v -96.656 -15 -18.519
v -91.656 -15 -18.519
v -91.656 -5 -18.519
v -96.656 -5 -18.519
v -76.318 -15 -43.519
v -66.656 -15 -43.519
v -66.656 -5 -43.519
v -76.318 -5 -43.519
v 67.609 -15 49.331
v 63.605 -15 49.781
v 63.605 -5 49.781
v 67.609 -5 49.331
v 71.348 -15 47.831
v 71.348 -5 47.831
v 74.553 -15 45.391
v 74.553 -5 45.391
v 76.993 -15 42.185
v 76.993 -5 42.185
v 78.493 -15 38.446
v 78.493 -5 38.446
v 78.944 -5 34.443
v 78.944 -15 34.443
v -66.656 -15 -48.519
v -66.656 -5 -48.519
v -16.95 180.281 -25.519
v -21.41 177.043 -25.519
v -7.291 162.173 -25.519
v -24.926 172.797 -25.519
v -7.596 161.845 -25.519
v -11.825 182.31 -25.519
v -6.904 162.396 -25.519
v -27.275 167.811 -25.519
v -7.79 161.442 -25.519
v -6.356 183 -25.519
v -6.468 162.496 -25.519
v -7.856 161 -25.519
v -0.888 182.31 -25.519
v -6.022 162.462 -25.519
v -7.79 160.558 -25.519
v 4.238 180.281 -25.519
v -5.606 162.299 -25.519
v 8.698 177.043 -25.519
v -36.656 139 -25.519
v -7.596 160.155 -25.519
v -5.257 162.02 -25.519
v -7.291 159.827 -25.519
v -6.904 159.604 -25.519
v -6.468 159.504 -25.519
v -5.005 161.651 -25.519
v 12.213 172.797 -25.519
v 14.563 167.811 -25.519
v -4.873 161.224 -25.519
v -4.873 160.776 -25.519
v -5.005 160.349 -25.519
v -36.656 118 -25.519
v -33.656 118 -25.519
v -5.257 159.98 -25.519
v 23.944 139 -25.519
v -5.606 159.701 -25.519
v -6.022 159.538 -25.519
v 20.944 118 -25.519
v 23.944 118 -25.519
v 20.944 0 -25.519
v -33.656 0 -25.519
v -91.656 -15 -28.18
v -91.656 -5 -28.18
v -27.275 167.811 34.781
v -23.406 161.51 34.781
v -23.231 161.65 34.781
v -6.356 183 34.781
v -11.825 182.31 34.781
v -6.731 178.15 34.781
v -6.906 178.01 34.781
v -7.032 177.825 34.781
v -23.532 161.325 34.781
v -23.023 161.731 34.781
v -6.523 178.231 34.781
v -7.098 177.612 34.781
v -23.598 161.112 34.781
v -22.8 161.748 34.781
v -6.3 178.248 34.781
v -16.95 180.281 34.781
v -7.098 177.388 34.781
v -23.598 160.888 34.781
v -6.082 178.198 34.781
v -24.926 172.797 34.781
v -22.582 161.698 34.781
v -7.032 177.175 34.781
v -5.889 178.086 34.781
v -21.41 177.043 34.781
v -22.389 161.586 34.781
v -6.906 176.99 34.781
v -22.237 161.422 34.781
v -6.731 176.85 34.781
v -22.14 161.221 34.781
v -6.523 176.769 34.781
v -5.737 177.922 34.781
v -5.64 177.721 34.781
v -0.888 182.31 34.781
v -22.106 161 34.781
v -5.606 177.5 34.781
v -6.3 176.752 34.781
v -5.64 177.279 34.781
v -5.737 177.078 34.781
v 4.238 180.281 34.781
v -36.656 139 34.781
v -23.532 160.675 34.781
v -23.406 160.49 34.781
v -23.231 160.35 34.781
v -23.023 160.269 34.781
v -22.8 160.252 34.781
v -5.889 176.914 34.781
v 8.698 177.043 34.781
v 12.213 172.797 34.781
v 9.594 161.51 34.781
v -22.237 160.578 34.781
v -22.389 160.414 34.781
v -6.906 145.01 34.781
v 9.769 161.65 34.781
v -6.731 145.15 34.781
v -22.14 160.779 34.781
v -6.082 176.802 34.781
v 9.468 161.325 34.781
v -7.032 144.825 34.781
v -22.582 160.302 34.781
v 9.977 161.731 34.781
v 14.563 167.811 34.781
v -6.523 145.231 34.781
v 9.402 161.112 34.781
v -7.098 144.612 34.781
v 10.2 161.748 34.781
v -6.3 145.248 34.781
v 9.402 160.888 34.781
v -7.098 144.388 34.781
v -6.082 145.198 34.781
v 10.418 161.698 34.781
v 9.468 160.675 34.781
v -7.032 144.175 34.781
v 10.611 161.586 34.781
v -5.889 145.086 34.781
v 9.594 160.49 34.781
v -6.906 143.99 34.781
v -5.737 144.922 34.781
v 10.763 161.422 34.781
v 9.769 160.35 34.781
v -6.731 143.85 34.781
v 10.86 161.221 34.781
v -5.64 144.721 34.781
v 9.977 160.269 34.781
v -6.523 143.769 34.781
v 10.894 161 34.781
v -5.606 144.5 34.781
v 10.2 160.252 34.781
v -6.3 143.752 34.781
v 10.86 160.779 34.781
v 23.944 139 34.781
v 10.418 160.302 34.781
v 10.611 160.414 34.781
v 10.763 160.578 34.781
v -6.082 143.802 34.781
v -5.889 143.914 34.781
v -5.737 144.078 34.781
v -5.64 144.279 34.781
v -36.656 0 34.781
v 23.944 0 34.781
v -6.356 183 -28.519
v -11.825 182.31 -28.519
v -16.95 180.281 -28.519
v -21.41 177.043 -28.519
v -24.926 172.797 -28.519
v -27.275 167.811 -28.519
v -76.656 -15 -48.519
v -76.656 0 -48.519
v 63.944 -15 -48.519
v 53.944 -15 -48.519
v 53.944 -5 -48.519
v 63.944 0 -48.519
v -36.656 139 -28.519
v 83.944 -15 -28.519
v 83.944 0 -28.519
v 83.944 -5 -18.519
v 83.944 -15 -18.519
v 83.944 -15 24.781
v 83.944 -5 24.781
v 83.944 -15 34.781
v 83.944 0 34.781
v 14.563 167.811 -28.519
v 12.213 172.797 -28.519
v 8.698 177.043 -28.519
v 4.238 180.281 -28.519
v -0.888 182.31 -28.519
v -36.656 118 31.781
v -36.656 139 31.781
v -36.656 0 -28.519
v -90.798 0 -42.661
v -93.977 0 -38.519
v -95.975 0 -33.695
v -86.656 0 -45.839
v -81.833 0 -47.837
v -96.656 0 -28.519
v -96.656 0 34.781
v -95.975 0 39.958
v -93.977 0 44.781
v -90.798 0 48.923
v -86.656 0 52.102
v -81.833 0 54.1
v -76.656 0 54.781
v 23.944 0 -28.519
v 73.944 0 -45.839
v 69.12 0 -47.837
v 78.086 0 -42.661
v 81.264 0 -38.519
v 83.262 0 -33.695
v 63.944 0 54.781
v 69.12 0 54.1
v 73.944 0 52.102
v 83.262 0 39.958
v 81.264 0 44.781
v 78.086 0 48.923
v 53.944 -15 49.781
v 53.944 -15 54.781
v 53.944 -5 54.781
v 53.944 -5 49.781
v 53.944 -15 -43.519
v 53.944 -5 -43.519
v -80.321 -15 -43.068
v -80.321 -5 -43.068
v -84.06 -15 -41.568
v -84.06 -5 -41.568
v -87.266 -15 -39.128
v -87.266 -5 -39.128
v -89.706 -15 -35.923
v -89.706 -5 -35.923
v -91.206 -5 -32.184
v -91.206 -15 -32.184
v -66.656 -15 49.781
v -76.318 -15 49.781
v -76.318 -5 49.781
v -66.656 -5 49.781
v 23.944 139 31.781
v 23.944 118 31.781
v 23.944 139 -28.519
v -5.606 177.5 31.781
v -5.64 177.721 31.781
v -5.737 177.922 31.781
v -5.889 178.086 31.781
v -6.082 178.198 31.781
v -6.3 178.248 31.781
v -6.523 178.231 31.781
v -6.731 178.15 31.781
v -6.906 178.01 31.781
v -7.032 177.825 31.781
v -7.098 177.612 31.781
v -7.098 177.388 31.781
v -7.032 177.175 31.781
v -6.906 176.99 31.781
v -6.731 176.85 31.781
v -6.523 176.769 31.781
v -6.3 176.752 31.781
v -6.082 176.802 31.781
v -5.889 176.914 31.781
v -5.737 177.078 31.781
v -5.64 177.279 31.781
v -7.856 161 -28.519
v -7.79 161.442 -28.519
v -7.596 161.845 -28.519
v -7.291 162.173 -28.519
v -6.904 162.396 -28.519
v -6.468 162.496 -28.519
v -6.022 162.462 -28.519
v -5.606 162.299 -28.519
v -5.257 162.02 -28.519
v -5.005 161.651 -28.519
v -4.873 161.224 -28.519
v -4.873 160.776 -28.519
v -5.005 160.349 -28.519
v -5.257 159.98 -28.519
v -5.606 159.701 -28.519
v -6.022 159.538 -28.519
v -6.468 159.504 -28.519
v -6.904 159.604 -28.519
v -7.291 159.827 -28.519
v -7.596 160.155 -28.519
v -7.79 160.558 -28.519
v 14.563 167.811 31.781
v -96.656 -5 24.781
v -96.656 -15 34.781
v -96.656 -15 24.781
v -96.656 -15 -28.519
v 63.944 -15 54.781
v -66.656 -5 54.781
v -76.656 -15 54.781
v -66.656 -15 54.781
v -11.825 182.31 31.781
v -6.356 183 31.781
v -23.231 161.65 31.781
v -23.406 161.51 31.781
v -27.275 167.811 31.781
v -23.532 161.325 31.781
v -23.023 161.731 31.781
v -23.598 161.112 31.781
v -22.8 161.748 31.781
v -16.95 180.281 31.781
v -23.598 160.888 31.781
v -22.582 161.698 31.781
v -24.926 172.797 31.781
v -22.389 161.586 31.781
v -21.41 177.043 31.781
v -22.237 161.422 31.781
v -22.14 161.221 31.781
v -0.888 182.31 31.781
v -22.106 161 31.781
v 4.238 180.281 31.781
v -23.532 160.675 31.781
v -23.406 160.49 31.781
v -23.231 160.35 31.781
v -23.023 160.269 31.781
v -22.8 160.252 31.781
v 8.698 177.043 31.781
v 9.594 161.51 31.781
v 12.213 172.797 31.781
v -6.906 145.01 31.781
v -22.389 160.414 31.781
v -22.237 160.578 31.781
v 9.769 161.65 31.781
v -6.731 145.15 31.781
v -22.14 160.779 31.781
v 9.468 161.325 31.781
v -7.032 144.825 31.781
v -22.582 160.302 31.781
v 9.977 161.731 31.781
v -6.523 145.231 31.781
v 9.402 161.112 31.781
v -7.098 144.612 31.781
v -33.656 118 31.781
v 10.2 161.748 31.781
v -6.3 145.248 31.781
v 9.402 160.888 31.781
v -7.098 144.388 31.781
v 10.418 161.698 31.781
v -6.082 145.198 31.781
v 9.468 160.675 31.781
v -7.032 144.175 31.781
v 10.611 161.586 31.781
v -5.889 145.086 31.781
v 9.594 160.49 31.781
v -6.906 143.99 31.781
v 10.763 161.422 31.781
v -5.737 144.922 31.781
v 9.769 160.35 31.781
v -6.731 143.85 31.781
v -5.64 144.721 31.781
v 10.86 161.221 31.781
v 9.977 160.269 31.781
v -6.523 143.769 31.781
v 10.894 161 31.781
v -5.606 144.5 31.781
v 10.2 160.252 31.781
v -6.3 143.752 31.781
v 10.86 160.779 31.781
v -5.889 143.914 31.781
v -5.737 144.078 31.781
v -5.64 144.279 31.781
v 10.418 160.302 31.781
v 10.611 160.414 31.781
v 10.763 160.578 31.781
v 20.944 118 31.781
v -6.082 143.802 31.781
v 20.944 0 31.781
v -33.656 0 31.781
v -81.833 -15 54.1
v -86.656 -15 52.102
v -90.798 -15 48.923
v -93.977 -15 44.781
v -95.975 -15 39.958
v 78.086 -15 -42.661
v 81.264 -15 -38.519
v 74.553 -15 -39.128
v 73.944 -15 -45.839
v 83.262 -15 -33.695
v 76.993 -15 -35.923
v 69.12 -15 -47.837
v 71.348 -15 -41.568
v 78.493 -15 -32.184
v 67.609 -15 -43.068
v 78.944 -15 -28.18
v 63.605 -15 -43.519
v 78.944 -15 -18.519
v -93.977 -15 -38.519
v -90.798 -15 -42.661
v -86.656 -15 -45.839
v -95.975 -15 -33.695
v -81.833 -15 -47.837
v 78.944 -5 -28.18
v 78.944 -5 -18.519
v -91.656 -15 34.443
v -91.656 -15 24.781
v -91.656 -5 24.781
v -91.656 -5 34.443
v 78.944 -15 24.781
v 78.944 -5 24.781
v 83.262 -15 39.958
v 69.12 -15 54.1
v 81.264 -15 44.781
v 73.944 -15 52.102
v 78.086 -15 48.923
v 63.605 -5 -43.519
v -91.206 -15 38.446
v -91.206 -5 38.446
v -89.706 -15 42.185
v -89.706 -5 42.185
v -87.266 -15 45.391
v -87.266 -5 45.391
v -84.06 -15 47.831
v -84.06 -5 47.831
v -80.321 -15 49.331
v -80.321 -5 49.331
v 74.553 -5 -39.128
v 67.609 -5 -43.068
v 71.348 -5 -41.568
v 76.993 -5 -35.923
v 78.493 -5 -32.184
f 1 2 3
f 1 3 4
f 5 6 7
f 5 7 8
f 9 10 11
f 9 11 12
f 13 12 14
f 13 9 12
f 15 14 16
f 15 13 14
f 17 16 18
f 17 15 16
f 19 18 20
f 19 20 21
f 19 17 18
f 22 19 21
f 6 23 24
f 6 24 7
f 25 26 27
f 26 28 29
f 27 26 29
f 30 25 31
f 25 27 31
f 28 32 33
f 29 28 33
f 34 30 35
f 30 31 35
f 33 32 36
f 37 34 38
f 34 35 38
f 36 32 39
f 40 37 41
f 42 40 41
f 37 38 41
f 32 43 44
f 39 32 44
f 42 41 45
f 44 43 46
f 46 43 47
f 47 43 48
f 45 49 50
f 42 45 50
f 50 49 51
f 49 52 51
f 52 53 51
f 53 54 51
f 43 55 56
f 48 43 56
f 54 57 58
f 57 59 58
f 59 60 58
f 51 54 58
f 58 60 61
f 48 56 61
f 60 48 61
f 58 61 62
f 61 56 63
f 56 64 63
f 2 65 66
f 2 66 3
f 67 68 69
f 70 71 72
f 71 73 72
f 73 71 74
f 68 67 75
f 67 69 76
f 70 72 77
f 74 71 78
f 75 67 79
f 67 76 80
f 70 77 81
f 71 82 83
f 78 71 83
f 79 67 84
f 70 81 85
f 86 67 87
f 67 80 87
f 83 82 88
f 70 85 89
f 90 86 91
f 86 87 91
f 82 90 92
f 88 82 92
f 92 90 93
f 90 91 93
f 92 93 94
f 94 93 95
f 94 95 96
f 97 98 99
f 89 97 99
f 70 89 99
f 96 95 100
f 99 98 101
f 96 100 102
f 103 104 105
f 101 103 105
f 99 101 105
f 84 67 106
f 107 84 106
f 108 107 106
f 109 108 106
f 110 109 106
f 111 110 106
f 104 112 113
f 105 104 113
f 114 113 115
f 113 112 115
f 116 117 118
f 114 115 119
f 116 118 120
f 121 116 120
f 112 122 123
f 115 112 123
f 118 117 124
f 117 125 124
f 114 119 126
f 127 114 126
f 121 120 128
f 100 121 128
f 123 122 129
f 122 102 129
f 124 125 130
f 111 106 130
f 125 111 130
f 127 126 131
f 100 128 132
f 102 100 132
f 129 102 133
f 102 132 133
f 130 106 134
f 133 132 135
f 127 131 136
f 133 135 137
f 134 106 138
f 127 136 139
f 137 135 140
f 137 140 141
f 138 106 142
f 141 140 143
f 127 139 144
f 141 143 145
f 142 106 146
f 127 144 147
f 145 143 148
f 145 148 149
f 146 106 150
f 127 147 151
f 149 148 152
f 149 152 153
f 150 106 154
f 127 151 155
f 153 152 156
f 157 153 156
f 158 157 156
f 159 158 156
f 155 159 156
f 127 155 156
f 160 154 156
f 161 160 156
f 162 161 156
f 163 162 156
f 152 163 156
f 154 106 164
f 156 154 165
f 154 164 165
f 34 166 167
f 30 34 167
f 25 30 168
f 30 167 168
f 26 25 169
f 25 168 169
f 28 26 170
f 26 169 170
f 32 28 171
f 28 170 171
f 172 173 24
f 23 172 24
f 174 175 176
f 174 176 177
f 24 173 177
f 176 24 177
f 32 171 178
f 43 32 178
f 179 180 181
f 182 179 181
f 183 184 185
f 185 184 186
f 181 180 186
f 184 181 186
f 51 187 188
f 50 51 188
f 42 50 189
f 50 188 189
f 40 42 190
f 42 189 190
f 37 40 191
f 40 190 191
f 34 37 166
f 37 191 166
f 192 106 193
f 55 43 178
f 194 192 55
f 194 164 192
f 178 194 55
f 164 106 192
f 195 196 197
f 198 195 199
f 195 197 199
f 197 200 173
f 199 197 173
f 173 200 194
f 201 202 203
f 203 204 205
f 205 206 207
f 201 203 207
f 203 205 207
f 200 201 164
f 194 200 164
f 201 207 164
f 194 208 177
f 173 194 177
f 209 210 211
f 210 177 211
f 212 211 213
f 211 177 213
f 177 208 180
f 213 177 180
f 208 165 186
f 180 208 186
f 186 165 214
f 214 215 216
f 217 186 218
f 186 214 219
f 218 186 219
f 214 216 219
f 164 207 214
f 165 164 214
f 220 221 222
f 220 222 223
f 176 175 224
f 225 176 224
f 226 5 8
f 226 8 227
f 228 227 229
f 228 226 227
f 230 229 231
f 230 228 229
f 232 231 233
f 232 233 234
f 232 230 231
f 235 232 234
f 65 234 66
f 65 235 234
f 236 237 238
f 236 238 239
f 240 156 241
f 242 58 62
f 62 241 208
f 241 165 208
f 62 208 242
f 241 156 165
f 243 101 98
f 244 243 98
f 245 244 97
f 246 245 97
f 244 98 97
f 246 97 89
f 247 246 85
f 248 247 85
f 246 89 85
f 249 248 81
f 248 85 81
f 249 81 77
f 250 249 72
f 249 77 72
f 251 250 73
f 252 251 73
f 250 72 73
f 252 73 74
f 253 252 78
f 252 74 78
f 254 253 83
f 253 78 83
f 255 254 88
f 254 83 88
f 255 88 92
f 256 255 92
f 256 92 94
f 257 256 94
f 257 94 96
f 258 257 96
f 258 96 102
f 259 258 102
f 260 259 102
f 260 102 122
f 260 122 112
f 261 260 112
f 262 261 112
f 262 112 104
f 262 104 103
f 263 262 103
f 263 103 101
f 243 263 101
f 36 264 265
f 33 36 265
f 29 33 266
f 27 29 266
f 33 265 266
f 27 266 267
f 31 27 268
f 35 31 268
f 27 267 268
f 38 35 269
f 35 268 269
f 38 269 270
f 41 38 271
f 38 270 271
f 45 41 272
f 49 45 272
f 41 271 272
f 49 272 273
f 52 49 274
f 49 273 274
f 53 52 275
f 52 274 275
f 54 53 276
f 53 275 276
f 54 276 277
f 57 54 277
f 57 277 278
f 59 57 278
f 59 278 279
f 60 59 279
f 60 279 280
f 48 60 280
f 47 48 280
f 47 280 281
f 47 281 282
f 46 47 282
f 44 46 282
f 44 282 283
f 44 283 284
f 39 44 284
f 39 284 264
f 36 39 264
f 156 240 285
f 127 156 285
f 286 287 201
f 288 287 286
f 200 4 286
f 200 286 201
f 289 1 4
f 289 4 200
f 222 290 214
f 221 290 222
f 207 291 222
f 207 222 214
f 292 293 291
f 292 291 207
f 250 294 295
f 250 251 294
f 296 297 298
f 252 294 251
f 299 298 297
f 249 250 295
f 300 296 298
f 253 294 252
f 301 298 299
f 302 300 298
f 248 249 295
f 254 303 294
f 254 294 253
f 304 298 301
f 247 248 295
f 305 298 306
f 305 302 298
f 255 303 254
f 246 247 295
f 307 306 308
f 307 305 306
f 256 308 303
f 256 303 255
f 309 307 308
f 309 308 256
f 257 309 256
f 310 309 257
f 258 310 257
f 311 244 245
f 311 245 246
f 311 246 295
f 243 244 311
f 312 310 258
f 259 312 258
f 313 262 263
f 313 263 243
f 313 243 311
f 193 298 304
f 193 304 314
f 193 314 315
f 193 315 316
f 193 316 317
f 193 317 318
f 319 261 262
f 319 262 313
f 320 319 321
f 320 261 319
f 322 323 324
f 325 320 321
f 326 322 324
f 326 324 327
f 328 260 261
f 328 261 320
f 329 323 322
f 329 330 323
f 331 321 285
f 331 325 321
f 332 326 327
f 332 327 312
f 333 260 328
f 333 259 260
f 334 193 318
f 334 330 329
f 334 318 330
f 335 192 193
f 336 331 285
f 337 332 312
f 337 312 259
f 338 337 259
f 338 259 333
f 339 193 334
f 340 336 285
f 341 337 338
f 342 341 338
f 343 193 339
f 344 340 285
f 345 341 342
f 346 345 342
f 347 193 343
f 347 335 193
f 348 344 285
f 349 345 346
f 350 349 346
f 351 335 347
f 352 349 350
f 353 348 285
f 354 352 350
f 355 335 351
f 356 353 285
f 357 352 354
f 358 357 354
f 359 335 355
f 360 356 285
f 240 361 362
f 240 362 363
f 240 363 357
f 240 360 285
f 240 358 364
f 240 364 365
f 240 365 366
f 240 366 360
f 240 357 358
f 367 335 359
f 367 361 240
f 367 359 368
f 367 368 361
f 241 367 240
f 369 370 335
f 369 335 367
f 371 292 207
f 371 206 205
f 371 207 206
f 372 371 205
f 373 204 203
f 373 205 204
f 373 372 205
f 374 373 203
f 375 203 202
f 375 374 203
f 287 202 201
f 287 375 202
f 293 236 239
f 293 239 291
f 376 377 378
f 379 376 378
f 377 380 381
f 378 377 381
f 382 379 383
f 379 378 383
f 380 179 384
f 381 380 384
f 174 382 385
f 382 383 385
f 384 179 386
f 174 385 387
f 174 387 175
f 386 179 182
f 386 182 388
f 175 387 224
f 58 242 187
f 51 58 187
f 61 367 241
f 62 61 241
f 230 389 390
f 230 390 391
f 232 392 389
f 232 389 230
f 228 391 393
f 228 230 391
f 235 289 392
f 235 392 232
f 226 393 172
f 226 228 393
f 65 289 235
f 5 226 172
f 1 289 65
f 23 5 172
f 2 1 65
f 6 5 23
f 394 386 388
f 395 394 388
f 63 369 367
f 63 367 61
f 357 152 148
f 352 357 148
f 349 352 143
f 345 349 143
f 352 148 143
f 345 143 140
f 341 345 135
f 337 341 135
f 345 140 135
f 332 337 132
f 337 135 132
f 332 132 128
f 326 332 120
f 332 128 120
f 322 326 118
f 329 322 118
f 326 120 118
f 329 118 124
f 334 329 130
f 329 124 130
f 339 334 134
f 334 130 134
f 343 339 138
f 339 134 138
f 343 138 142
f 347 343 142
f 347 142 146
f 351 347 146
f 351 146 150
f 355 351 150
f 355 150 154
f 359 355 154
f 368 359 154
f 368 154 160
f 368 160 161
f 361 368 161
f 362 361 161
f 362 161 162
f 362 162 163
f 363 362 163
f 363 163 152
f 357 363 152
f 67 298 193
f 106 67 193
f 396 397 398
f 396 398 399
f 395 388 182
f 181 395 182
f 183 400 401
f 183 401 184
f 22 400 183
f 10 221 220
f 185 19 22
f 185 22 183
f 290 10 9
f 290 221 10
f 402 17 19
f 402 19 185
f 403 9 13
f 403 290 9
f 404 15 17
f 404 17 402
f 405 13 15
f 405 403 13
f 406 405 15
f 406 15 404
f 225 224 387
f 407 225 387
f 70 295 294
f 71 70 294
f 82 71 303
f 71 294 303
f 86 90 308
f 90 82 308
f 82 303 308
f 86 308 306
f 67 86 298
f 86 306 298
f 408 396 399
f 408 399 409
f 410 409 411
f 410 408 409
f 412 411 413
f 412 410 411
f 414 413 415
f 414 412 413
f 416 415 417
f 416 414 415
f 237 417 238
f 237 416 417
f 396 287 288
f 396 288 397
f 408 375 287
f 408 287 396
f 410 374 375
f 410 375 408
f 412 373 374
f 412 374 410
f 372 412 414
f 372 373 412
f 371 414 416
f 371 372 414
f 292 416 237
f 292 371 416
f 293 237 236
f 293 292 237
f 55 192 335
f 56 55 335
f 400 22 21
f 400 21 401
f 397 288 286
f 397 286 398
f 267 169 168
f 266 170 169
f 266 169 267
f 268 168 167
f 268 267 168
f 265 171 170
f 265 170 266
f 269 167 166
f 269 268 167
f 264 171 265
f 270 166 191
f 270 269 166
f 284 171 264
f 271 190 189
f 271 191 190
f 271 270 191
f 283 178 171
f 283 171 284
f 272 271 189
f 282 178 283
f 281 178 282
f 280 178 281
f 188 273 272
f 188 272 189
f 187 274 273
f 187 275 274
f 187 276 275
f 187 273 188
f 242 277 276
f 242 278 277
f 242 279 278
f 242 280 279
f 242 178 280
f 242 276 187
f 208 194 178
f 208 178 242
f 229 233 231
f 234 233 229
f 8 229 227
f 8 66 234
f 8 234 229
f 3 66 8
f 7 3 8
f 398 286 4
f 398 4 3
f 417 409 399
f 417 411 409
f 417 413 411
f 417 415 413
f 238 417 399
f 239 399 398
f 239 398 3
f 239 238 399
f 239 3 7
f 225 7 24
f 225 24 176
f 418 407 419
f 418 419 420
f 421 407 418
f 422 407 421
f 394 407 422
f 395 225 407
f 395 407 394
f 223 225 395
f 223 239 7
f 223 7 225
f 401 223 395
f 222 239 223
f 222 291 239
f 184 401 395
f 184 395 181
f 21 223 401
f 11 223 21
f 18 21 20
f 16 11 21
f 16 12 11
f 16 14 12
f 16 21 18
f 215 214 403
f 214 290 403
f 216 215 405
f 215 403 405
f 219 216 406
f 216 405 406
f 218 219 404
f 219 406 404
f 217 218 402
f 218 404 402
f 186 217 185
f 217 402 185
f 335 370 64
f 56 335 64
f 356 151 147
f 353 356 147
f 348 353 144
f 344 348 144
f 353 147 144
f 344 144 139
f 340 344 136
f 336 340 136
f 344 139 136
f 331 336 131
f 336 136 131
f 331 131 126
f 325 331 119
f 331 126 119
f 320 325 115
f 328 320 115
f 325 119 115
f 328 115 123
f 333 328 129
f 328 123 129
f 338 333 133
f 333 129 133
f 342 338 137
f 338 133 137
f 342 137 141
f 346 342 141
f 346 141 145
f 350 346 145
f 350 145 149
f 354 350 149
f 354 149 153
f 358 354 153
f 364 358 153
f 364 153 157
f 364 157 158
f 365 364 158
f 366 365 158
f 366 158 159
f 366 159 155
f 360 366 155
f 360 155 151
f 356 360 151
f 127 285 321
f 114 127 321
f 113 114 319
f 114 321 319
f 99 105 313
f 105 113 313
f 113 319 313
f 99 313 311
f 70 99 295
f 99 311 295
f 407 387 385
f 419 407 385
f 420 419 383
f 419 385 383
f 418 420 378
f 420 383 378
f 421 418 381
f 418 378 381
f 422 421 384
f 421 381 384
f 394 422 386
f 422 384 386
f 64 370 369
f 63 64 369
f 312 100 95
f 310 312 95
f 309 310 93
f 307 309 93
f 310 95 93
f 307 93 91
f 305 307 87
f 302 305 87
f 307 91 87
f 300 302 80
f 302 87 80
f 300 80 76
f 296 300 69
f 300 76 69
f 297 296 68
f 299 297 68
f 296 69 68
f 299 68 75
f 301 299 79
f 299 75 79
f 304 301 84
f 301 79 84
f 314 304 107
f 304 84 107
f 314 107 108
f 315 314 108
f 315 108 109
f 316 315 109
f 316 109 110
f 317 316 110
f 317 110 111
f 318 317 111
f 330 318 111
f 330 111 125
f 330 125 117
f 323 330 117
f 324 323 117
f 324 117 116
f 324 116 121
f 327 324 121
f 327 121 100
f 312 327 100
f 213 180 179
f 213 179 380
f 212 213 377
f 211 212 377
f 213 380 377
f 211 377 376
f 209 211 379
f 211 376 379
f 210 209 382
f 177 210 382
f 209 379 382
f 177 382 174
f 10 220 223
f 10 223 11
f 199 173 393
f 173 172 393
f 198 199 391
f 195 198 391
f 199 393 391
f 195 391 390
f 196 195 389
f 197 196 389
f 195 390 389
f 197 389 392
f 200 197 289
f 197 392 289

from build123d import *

# Parameters (mm, degrees)
SKETCH_1_W          = 60.6
SKETCH_1_H          = 63.3
SKETCH_1_W_2        = 54.6
SKETCH_1_H_2        = 57.3
EXTRUDE_1_DEPTH     = 118
SKETCH_2_W          = 60.6
SKETCH_2_H          = 3
EXTRUDE_2_DEPTH     = 65
CUT_EXTRUDE_1_DEPTH = 65
SKETCH_4_W          = 180.6
SKETCH_4_H          = 103.3
EXTRUDE_3_DEPTH     = 5
CUT_EXTRUDE_2_DEPTH = 5
EXTRUDE_START       = 10
EXTRUDE_4_DEPTH     = 10
SKETCH_8_R          = 0.75
CUT_EXTRUDE_3_DEPTH = 10
SKETCH_9_R          = 1.5
CUT_EXTRUDE_4_DEPTH = 10


with BuildPart() as part:
    # 草图1 → 凸台-拉伸1 (new body)
    with BuildSketch(Plane(origin=(0, 0, 0), x_dir=(1, 0, 0), z_dir=(0, 1, 0))):
        with Locations((-6.35625, -3.13125)):
            Rectangle(SKETCH_1_W, SKETCH_1_H)
        with Locations((-6.35625, -3.13125)):
            Rectangle(SKETCH_1_W_2, SKETCH_1_H_2, mode=Mode.SUBTRACT)
    extrude(amount=EXTRUDE_1_DEPTH)

    # 草图2 → 凸台-拉伸2 (add)
    with BuildSketch(Plane(origin=(0, 118, 0), x_dir=(1, 0, 0), z_dir=(0, 1, 0))):
        with Locations((-6.35625, 27.01875)):
            Rectangle(SKETCH_2_W, SKETCH_2_H)
        with Locations((-6.35625, -33.28125)):
            Rectangle(SKETCH_2_W, SKETCH_2_H)
    extrude(amount=EXTRUDE_2_DEPTH)

    # 草图3 → 切除-拉伸1 (cut)
    with BuildSketch(Plane(origin=(0, 0, -28.51875), x_dir=(-1, 0, 0), z_dir=(0, 0, -1))):
        with BuildLine():
            Line((36.65625, 183), (6.356250104, 183))
            ThreePointArc((6.356250104, 183), (19.282049563, 178.802351128), (27.275306551, 167.811246068))
            Line((27.275306551, 167.811246068), (36.65625, 139))
            Line((36.65625, 139), (36.65625, 183))
        make_face()
        with BuildLine():
            Line((-23.94375, 183), (-23.94375, 139))
            Line((-23.94375, 139), (-14.562806551, 167.811246068))
            ThreePointArc((-14.562806551, 167.811246068), (-6.569549479, 178.802351188), (6.356250104, 183))
            Line((6.356250104, 183), (-23.94375, 183))
        make_face()
    extrude(amount=-CUT_EXTRUDE_1_DEPTH, mode=Mode.SUBTRACT)

    # 草图4 → 凸台-拉伸3 (add)
    with BuildSketch(Plane.XZ):
        with Locations((-6.35625, 3.13125)):
            Rectangle(SKETCH_4_W, SKETCH_4_H)
    extrude(amount=EXTRUDE_3_DEPTH)

    # 草图5 → 切除-拉伸2 (cut)
    with BuildSketch(Plane.XZ.offset(5)):
        with BuildLine():
            ThreePointArc((-76.65625, -48.51875), (-90.798385624, -42.660885624), (-96.65625, -28.51875))
            Line((-96.65625, -28.51875), (-96.65625, -48.51875))
            Line((-96.65625, -48.51875), (-76.65625, -48.51875))
        make_face()
        with BuildLine():
            Line((-76.65625, 54.78125), (-86.65625, 54.78125))
            Line((-86.65625, 54.78125), (-96.65625, 54.78125))
            Line((-96.65625, 54.78125), (-96.65625, 34.78125))
            ThreePointArc((-96.65625, 34.78125), (-90.798385624, 48.923385624), (-76.65625, 54.78125))
        make_face()
        with BuildLine():
            Line((83.94375, 54.78125), (63.94375, 54.78125))
            ThreePointArc((63.94375, 54.78125), (78.085885624, 48.923385624), (83.94375, 34.78125))
            Line((83.94375, 34.78125), (83.94375, 54.78125))
        make_face()
        with BuildLine():
            Line((83.94375, -48.51875), (83.94375, -28.51875))
            ThreePointArc((83.94375, -28.51875), (78.085885624, -42.660885624), (63.94375, -48.51875))
            Line((63.94375, -48.51875), (83.94375, -48.51875))
        make_face()
    extrude(amount=-CUT_EXTRUDE_2_DEPTH, mode=Mode.SUBTRACT)

    # 草图6 → 凸台-拉伸4 (add)
    with BuildSketch(Plane.XZ.offset(5).offset(EXTRUDE_START)):
        with BuildLine():
            Line((-76.317762068, 49.78125), (-66.65625, 49.78125))
            Line((-66.65625, 49.78125), (-66.65625, 54.78125))
            Line((-66.65625, 54.78125), (-76.65625, 54.78125))
            ThreePointArc((-76.65625, 54.78125), (-90.798385624, 48.923385624), (-96.65625, 34.78125))
            Line((-96.65625, 34.78125), (-96.65625, 24.78125))
            Line((-96.65625, 24.78125), (-91.65625, 24.78125))
            Line((-91.65625, 24.78125), (-91.65625, 34.442762068))
            ThreePointArc((-91.65625, 34.442762068), (-87.265551911, 45.390551911), (-76.317762068, 49.78125))
        make_face()
        with BuildLine():
            Line((78.94375, 24.78125), (83.94375, 24.78125))
            Line((83.94375, 24.78125), (83.94375, 34.78125))
            ThreePointArc((83.94375, 34.78125), (78.085885624, 48.923385624), (63.94375, 54.78125))
            Line((63.94375, 54.78125), (53.94375, 54.78125))
            Line((53.94375, 54.78125), (53.94375, 49.78125))
            Line((53.94375, 49.78125), (63.605262068, 49.78125))
            ThreePointArc((63.605262068, 49.78125), (74.553051911, 45.390551911), (78.94375, 34.442762068))
            Line((78.94375, 34.442762068), (78.94375, 24.78125))
        make_face()
        with BuildLine():
            Line((78.94375, -28.180262068), (78.94375, -18.51875))
            Line((78.94375, -18.51875), (83.94375, -18.51875))
            Line((83.94375, -18.51875), (83.94375, -28.51875))
            ThreePointArc((83.94375, -28.51875), (78.085885624, -42.660885624), (63.94375, -48.51875))
            Line((63.94375, -48.51875), (53.94375, -48.51875))
            Line((53.94375, -48.51875), (53.94375, -43.51875))
            Line((53.94375, -43.51875), (63.605262068, -43.51875))
            ThreePointArc((63.605262068, -43.51875), (74.553051911, -39.128051911), (78.94375, -28.180262068))
        make_face()
        with BuildLine():
            Line((-91.65625, -18.51875), (-96.65625, -18.51875))
            Line((-96.65625, -18.51875), (-96.65625, -28.51875))
            ThreePointArc((-96.65625, -28.51875), (-90.798385624, -42.660885624), (-76.65625, -48.51875))
            Line((-76.65625, -48.51875), (-66.65625, -48.51875))
            Line((-66.65625, -48.51875), (-66.65625, -43.51875))
            Line((-66.65625, -43.51875), (-76.317762068, -43.51875))
            ThreePointArc((-76.317762068, -43.51875), (-87.265551911, -39.128051911), (-91.65625, -28.180262068))
            Line((-91.65625, -28.180262068), (-91.65625, -18.51875))
        make_face()
    extrude(amount=-EXTRUDE_4_DEPTH)

    # 草图8 → 切除-拉伸3 (cut)
    with BuildSketch(Plane.XY.offset(34.78125)):
        with Locations((-6.35625, 177.5)):
            Circle(SKETCH_8_R)
        with Locations((10.14375, 161)):
            Circle(SKETCH_8_R)
        with Locations((-6.35625, 144.5)):
            Circle(SKETCH_8_R)
        with Locations((-22.85625, 161)):
            Circle(SKETCH_8_R)
    extrude(amount=-CUT_EXTRUDE_3_DEPTH, mode=Mode.SUBTRACT)

    # 草图9 → 切除-拉伸4 (cut)
    with BuildSketch(Plane(origin=(0, 0, -28.51875), x_dir=(-1, 0, 0), z_dir=(0, 0, -1))):
        with Locations((6.35625, 161)):
            Circle(SKETCH_9_R)
    extrude(amount=-CUT_EXTRUDE_4_DEPTH, mode=Mode.SUBTRACT)


solid = part.part
